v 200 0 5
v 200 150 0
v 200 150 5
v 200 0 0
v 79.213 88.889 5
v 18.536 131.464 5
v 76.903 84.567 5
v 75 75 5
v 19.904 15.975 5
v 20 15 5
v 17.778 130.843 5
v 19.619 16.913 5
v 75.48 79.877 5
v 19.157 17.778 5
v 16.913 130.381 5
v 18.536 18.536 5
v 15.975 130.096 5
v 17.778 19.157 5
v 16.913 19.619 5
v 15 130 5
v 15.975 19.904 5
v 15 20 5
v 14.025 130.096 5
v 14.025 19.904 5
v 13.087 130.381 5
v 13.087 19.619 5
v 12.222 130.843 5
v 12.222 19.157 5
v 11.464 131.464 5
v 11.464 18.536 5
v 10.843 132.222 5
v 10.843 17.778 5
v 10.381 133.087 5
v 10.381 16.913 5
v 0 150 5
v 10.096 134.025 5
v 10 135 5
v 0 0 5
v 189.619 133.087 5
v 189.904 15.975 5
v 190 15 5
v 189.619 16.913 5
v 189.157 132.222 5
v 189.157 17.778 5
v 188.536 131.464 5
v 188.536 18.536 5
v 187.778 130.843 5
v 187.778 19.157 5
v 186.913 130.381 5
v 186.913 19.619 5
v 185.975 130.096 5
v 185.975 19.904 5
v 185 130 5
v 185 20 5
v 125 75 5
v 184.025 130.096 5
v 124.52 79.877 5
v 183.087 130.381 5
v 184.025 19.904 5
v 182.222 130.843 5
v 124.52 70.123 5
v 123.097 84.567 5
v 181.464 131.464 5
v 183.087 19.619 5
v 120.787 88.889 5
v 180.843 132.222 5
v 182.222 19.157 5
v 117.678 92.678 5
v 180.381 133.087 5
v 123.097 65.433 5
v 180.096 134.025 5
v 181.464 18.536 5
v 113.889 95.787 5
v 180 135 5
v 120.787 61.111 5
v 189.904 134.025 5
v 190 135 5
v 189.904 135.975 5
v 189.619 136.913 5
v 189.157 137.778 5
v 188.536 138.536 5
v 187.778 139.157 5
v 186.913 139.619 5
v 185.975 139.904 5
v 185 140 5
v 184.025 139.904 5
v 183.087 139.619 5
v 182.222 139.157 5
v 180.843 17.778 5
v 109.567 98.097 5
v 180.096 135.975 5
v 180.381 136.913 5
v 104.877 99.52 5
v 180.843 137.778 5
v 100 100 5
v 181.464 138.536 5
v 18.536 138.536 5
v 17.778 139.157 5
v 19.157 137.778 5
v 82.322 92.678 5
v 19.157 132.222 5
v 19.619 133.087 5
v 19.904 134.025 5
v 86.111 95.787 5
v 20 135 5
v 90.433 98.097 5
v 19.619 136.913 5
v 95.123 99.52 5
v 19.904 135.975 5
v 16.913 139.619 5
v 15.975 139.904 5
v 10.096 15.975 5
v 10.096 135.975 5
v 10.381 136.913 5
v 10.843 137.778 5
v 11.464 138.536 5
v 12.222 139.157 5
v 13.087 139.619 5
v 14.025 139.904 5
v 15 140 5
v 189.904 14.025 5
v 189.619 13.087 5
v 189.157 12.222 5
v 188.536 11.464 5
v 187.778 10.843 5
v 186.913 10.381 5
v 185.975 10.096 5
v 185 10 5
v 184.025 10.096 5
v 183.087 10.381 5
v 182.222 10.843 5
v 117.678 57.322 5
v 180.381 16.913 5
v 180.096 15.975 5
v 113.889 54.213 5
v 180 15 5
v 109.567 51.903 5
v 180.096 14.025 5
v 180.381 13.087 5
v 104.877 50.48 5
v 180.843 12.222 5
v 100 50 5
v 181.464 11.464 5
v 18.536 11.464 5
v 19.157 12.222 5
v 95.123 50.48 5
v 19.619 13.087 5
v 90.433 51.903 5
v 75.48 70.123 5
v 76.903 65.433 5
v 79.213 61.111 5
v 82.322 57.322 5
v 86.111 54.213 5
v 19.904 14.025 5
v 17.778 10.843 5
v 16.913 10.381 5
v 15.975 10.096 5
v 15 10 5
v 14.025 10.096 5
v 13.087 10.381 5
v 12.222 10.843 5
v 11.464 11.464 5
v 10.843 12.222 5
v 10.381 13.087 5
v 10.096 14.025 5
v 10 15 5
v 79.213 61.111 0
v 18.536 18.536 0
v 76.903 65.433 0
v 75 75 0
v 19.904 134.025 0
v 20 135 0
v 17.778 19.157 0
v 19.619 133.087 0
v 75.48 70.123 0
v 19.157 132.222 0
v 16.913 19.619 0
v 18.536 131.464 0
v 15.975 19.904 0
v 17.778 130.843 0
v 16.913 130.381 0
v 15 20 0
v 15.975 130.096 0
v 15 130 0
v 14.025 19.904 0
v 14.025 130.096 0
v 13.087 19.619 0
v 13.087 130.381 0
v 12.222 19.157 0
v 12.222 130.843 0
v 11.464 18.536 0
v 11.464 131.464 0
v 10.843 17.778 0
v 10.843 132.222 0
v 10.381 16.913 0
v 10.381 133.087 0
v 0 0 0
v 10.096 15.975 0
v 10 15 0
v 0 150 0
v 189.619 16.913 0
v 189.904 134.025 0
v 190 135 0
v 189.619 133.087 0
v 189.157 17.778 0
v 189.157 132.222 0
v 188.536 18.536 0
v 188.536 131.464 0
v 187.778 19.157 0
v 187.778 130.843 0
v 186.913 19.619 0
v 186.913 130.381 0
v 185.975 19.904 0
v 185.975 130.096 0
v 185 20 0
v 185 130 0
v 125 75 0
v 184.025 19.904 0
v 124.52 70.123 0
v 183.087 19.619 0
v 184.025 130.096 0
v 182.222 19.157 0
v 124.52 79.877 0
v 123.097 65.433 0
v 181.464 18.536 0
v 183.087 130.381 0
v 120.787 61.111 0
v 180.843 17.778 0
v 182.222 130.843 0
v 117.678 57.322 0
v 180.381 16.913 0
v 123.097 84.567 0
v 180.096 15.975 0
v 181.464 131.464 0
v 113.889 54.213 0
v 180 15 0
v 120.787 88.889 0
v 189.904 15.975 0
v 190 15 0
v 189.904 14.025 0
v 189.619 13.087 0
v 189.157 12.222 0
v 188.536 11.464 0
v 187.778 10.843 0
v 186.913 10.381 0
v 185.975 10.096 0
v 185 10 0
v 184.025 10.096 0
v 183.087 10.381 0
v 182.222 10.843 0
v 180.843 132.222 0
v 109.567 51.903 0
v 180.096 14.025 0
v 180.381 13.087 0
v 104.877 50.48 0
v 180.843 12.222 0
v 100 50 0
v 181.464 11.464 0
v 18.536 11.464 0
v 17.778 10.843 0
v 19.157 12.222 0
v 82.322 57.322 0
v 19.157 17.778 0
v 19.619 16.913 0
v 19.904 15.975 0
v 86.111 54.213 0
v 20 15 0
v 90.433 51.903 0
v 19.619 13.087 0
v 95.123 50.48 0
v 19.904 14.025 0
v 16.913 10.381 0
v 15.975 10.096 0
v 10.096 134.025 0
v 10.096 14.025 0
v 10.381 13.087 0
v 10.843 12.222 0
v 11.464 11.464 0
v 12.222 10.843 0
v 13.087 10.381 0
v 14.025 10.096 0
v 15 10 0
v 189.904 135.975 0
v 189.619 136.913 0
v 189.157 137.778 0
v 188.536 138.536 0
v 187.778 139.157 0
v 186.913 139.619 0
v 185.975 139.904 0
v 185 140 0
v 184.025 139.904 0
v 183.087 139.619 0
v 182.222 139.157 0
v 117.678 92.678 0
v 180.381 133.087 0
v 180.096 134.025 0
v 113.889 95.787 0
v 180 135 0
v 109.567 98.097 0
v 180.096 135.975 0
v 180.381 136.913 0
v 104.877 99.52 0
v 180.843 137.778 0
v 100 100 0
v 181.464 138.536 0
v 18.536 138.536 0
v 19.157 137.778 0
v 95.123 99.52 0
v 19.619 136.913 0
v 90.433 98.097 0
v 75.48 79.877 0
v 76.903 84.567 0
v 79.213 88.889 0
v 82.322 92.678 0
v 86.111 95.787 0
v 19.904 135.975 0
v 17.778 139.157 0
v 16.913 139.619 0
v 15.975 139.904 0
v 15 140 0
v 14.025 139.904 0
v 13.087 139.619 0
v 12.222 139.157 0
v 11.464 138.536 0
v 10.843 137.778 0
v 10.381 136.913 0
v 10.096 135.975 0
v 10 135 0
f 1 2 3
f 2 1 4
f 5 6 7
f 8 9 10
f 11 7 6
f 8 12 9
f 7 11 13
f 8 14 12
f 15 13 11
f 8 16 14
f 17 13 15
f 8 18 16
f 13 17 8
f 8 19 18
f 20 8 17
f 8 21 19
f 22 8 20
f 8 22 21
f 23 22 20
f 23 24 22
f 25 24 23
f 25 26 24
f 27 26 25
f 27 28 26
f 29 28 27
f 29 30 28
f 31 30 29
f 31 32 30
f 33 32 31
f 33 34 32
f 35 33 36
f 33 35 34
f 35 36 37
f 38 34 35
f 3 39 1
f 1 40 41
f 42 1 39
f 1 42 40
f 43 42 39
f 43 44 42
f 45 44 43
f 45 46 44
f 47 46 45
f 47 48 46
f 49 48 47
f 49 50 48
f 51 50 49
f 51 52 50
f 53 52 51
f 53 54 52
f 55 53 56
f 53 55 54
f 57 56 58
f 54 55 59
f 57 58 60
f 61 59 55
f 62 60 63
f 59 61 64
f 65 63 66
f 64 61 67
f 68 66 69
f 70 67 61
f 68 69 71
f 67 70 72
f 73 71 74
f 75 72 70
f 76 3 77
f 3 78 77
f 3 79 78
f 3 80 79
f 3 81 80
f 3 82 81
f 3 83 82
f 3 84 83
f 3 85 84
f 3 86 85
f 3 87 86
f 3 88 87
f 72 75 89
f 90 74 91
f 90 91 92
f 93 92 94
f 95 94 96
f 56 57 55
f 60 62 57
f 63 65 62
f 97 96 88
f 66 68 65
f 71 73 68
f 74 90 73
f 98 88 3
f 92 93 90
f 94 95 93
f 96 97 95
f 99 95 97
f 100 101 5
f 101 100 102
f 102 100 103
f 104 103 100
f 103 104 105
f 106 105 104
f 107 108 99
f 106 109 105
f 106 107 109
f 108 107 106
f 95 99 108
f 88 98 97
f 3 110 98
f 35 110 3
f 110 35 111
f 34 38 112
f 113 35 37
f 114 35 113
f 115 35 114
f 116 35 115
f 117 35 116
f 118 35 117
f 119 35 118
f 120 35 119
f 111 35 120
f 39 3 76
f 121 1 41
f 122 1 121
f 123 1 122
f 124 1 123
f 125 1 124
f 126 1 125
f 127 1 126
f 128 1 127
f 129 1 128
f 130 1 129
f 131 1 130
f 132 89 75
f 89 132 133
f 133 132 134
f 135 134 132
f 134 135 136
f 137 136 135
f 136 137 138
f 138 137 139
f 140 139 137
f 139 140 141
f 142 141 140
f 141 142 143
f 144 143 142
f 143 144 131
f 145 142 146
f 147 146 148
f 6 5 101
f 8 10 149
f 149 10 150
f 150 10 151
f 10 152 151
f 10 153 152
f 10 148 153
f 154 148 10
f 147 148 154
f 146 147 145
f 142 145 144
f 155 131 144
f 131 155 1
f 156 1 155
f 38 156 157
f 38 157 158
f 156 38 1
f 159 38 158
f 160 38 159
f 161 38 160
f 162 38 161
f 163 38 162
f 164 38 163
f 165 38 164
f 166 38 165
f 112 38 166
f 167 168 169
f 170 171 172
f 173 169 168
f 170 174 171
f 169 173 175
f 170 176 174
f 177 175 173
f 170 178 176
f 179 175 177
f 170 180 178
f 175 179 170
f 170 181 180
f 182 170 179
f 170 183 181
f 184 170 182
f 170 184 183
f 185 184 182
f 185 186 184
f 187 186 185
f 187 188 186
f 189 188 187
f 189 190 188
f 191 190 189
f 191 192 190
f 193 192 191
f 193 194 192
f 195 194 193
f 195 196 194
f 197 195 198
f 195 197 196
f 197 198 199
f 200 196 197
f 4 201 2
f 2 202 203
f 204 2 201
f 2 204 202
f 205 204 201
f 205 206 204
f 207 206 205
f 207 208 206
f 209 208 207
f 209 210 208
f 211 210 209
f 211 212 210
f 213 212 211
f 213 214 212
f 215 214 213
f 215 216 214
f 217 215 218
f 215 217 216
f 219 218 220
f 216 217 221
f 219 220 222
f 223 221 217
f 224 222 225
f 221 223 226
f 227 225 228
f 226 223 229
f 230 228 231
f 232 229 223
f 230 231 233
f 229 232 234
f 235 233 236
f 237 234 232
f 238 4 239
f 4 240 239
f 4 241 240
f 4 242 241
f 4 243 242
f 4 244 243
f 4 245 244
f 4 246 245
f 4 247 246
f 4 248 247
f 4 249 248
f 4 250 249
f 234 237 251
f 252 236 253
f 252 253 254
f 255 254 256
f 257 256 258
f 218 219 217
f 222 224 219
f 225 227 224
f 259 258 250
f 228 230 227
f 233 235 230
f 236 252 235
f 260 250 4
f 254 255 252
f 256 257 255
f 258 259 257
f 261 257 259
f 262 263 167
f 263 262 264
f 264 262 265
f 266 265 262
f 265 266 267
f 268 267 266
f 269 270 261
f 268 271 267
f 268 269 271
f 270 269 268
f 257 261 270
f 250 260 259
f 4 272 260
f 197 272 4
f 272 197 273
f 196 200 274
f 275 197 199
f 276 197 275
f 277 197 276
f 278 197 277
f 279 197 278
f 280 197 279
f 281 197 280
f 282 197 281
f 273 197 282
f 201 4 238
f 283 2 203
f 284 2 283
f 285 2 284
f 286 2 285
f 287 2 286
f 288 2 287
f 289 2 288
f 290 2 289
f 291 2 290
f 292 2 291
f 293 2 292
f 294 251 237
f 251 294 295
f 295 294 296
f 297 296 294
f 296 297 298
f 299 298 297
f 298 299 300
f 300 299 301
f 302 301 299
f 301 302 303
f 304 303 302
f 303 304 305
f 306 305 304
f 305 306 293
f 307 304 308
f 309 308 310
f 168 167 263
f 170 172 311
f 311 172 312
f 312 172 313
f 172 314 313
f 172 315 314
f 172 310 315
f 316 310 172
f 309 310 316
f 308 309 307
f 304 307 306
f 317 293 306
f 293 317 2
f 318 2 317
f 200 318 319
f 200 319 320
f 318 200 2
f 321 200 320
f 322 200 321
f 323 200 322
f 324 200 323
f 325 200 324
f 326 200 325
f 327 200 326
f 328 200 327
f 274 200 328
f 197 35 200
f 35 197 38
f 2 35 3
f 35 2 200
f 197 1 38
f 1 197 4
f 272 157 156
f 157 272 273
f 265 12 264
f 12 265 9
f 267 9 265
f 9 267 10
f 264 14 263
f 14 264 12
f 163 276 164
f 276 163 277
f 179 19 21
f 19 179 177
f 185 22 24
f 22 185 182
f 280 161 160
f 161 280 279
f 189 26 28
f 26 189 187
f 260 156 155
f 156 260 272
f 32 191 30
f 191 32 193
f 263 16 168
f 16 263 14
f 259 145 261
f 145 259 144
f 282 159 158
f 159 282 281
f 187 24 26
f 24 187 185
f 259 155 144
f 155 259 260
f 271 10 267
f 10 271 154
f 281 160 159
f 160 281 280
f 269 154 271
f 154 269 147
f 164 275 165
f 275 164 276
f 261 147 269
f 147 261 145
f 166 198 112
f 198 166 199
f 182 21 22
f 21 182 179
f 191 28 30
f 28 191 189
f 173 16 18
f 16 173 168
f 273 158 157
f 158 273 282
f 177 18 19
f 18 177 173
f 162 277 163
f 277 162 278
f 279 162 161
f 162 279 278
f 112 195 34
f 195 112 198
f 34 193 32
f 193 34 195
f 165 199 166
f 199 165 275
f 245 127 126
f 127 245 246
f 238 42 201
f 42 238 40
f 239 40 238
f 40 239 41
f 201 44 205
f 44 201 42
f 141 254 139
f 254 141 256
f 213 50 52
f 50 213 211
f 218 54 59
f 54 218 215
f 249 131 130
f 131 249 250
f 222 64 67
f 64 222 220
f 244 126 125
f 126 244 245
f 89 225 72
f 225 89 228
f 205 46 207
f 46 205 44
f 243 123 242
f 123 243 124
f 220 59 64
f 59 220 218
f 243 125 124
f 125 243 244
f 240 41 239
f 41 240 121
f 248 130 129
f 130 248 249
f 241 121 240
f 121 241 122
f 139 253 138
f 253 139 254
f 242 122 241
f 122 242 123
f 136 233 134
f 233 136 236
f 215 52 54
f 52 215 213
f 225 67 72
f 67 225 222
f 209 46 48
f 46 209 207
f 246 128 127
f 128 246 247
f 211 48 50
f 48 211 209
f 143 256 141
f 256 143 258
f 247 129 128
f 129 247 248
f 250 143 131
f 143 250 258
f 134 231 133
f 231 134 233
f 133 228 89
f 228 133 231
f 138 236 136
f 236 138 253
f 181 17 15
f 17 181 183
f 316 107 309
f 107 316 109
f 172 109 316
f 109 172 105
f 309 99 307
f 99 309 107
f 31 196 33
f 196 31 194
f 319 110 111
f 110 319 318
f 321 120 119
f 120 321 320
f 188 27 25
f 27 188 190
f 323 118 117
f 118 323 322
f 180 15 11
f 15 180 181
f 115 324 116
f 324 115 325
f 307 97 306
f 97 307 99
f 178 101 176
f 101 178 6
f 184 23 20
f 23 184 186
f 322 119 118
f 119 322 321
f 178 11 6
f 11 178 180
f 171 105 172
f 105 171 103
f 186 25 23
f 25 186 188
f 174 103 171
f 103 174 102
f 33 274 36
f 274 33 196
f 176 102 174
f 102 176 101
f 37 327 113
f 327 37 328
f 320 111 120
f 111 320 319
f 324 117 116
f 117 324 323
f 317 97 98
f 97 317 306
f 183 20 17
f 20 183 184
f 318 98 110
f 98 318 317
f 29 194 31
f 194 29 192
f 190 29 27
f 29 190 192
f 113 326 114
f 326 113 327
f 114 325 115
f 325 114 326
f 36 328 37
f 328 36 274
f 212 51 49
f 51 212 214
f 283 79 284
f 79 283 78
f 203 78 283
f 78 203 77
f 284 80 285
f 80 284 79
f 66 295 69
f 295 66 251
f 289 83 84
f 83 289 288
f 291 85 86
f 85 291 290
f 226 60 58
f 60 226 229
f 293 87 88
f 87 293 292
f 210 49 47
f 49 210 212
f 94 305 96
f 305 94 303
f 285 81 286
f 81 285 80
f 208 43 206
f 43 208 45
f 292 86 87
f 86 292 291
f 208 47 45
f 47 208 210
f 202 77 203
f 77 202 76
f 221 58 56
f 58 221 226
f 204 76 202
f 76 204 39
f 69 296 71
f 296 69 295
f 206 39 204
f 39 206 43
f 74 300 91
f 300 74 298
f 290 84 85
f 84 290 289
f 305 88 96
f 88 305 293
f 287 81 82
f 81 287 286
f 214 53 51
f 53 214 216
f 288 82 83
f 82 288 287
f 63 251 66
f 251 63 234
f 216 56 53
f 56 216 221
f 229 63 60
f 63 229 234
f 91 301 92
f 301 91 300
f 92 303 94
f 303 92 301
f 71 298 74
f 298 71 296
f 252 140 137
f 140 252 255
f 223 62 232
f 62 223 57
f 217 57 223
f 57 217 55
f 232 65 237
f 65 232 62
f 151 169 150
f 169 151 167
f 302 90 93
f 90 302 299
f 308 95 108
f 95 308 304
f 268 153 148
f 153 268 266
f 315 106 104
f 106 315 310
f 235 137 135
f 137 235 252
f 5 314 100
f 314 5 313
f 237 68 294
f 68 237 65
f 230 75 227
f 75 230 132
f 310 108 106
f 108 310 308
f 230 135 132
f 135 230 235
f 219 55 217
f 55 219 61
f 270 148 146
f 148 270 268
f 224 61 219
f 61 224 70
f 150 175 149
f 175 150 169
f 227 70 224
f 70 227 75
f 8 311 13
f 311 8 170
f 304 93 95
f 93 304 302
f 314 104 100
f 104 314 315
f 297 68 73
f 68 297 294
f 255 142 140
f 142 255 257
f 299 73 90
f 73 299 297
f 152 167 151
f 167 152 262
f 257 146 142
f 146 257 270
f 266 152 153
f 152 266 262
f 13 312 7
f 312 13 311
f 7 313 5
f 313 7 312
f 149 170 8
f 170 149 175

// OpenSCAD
$fn = 32;

// ----------------------------------------------------------------------
// Big plate: 200-250 mm adapter plate
// ----------------------------------------------------------------------

// --- parameters (mm) ---
plate_l = 200;            // plate length, X
plate_w = 150;            // plate width, Y
plate_t = 5;              // plate thickness, Z
corner_d = 10;            // corner hole diameter
corner_in = 15;           // corner hole inset from the edges
bore_d = 50;              // central bore

difference() {
  cube([plate_l, plate_w, plate_t]);
  translate([corner_in, corner_in, -1]) cylinder(h = plate_t + 2, d = corner_d);
  translate([plate_l - corner_in, corner_in, -1]) cylinder(h = plate_t + 2, d = corner_d);
  translate([corner_in, plate_w - corner_in, -1]) cylinder(h = plate_t + 2, d = corner_d);
  translate([plate_l - corner_in, plate_w - corner_in, -1]) cylinder(h = plate_t + 2, d = corner_d);
  translate([plate_l / 2, plate_w / 2, -1]) cylinder(h = plate_t + 2, d = bore_d);
}
